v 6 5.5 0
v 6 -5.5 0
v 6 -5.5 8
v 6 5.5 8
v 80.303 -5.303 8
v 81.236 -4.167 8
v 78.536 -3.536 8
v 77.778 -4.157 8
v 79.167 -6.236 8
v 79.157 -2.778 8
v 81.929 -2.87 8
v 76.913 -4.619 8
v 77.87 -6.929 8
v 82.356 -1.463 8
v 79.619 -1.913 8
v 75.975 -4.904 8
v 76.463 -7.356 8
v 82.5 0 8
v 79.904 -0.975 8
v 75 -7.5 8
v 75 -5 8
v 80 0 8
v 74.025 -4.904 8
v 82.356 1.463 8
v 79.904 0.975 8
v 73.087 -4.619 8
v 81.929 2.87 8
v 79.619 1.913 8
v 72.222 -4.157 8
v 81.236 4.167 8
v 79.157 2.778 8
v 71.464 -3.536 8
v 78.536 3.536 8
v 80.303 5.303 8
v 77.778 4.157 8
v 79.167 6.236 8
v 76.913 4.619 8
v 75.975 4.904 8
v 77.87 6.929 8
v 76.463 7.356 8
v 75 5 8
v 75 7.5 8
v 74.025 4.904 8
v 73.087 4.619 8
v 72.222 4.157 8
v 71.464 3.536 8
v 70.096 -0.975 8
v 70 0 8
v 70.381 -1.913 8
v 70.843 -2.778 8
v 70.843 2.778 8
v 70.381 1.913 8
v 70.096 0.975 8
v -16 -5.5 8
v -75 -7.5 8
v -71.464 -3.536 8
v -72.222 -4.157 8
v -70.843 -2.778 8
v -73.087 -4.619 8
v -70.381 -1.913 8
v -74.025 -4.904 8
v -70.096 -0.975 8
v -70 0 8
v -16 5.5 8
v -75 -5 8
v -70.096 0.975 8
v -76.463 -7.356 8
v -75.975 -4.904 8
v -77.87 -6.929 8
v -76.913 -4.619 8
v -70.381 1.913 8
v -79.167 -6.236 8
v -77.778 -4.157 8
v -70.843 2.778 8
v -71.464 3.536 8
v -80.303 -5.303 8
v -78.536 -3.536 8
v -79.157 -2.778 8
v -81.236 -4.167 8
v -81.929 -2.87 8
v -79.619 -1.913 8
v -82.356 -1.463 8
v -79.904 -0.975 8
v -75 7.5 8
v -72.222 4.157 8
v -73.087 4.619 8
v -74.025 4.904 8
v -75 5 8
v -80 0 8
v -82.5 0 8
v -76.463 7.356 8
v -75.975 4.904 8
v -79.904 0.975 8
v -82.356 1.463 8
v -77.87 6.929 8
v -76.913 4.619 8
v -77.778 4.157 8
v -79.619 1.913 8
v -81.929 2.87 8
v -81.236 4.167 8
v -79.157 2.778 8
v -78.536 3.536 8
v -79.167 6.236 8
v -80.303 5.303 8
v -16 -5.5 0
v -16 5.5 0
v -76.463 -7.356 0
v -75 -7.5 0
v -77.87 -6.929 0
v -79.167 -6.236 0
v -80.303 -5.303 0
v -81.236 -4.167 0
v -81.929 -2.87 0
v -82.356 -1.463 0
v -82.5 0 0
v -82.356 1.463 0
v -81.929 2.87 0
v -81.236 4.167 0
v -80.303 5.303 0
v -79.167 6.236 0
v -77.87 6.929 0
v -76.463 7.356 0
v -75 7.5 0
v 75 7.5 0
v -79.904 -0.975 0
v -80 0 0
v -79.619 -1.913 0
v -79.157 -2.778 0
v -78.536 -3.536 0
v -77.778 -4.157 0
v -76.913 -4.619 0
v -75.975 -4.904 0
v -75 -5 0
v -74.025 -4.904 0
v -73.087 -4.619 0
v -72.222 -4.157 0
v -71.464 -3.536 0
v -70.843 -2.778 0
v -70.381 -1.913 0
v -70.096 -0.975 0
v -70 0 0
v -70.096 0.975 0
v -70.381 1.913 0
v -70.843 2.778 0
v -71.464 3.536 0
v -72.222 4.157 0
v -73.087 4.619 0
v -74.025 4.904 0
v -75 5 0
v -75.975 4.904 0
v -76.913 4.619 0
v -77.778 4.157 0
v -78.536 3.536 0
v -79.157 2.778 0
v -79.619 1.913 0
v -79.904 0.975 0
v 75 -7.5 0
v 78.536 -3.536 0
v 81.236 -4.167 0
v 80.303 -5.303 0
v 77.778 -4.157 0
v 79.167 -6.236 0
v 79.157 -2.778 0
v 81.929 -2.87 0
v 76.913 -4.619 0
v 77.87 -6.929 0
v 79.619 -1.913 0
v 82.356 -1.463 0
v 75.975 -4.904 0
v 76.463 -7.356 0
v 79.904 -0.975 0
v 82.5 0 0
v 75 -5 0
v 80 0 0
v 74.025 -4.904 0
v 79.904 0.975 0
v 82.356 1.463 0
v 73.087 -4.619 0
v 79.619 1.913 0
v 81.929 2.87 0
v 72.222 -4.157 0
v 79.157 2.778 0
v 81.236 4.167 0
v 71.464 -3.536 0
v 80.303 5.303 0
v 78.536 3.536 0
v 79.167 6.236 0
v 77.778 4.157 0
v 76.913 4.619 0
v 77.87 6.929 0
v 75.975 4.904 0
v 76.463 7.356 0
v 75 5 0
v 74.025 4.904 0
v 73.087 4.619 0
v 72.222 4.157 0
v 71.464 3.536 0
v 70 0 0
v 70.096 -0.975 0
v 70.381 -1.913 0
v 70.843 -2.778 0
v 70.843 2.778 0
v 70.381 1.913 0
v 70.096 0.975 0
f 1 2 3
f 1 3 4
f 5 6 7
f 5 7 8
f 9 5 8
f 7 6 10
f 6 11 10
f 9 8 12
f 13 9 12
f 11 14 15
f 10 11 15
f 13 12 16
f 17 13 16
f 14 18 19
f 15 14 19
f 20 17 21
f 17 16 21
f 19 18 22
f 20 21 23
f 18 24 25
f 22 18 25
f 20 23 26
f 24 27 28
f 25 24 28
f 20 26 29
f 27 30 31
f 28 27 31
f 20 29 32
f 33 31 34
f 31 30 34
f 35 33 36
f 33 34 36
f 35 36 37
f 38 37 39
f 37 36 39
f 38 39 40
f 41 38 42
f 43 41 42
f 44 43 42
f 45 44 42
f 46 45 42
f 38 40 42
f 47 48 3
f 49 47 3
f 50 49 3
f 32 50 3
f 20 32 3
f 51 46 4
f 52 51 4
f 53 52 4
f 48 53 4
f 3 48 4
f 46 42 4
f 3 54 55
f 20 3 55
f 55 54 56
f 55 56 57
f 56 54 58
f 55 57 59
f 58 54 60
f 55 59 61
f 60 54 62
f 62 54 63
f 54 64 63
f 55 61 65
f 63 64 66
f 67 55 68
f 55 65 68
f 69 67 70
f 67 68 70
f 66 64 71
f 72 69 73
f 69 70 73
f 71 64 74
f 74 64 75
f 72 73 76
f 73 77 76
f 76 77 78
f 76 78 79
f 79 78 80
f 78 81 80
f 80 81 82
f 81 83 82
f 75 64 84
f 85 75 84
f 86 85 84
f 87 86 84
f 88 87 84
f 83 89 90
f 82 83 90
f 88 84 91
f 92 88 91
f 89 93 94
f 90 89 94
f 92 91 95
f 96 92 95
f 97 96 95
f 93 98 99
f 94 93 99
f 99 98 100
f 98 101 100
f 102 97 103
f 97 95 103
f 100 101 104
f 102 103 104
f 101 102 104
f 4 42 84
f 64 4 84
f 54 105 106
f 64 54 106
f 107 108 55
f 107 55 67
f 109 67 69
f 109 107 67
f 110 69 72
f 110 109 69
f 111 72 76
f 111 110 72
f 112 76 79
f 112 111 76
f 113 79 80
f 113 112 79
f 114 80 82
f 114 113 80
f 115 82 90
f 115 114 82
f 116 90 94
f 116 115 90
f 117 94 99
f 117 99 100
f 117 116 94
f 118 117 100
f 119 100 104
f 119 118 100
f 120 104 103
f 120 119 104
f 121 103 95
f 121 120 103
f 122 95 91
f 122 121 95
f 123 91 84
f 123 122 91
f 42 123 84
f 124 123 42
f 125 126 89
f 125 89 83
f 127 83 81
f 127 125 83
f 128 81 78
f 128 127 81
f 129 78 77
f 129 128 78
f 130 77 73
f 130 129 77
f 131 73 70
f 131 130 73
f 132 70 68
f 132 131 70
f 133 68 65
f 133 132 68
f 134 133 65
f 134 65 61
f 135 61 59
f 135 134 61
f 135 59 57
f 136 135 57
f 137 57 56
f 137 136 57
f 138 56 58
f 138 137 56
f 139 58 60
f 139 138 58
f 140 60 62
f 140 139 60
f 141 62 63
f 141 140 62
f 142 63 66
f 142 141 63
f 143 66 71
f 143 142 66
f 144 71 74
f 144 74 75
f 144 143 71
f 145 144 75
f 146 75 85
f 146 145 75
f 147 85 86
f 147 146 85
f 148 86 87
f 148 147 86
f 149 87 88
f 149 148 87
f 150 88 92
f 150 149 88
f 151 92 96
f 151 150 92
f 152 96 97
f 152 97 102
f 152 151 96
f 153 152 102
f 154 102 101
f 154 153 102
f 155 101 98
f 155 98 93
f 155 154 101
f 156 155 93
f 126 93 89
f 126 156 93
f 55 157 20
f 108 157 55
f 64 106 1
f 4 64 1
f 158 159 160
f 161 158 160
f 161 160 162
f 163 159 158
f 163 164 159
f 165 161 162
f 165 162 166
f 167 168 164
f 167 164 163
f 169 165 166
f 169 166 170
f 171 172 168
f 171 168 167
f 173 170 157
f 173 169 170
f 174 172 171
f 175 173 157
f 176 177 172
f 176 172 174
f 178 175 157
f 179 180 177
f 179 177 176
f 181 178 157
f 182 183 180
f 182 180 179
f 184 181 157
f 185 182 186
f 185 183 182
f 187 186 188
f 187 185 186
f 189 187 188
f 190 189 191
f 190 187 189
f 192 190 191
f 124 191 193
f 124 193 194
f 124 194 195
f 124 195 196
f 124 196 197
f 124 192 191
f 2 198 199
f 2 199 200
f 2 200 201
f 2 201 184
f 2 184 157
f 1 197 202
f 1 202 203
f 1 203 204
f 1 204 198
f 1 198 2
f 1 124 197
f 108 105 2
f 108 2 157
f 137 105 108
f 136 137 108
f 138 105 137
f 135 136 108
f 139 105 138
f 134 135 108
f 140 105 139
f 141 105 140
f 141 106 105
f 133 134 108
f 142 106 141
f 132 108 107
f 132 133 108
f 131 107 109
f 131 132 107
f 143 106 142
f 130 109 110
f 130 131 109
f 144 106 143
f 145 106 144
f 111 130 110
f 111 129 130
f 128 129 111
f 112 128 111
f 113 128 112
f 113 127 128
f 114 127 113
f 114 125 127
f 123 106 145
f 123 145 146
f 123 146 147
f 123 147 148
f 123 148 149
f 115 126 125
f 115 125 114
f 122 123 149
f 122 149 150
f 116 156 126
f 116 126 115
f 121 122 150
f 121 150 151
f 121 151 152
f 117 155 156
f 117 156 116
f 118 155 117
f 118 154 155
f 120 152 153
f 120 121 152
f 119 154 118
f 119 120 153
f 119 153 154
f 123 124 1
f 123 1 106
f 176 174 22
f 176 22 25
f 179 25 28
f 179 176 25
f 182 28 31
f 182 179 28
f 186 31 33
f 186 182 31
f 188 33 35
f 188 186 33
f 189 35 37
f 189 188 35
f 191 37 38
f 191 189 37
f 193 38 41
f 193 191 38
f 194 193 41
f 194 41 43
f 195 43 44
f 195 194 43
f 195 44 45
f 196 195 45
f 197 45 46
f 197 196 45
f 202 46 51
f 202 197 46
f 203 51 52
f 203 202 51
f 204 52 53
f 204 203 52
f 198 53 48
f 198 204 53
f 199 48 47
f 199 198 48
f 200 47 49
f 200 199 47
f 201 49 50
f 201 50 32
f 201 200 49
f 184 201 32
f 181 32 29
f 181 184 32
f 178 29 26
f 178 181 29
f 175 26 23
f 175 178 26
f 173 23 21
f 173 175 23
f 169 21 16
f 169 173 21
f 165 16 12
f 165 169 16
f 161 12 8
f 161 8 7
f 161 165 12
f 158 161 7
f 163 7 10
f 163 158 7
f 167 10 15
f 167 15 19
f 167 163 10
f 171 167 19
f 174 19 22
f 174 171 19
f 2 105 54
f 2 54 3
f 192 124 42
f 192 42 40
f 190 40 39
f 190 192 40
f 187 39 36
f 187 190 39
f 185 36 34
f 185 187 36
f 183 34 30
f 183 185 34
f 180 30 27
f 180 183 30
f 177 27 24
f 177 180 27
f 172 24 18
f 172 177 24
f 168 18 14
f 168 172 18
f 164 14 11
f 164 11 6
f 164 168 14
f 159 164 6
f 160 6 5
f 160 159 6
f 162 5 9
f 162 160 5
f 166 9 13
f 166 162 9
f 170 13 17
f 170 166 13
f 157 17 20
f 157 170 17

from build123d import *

# Parameters (mm, degrees)
SKETCH1_R           = 5
SKETCH1_W           = 22
SKETCH1_H           = 11
BOSS_EXTRUDE1_DEPTH = 8


with BuildPart() as part:
    # Sketch1 → Boss-Extrude1 (new body)
    with BuildSketch(Plane.XY):
        with BuildLine():
            Line((75, -7.5), (-75, -7.5))
            ThreePointArc((-75, -7.5), (-82.5, 0), (-75, 7.5))
            Line((-75, 7.5), (75, 7.5))
            ThreePointArc((75, 7.5), (82.5, 0), (75, -7.5))
        make_face()
        with Locations((75, 0)):
            Circle(SKETCH1_R, mode=Mode.SUBTRACT)
        with Locations(Location((-75, 0, 0), (0, 0, 180))):
            Circle(SKETCH1_R, mode=Mode.SUBTRACT)
        with Locations((-5, 0)):
            Rectangle(SKETCH1_W, SKETCH1_H, mode=Mode.SUBTRACT)
    extrude(amount=BOSS_EXTRUDE1_DEPTH)


solid = part.part
